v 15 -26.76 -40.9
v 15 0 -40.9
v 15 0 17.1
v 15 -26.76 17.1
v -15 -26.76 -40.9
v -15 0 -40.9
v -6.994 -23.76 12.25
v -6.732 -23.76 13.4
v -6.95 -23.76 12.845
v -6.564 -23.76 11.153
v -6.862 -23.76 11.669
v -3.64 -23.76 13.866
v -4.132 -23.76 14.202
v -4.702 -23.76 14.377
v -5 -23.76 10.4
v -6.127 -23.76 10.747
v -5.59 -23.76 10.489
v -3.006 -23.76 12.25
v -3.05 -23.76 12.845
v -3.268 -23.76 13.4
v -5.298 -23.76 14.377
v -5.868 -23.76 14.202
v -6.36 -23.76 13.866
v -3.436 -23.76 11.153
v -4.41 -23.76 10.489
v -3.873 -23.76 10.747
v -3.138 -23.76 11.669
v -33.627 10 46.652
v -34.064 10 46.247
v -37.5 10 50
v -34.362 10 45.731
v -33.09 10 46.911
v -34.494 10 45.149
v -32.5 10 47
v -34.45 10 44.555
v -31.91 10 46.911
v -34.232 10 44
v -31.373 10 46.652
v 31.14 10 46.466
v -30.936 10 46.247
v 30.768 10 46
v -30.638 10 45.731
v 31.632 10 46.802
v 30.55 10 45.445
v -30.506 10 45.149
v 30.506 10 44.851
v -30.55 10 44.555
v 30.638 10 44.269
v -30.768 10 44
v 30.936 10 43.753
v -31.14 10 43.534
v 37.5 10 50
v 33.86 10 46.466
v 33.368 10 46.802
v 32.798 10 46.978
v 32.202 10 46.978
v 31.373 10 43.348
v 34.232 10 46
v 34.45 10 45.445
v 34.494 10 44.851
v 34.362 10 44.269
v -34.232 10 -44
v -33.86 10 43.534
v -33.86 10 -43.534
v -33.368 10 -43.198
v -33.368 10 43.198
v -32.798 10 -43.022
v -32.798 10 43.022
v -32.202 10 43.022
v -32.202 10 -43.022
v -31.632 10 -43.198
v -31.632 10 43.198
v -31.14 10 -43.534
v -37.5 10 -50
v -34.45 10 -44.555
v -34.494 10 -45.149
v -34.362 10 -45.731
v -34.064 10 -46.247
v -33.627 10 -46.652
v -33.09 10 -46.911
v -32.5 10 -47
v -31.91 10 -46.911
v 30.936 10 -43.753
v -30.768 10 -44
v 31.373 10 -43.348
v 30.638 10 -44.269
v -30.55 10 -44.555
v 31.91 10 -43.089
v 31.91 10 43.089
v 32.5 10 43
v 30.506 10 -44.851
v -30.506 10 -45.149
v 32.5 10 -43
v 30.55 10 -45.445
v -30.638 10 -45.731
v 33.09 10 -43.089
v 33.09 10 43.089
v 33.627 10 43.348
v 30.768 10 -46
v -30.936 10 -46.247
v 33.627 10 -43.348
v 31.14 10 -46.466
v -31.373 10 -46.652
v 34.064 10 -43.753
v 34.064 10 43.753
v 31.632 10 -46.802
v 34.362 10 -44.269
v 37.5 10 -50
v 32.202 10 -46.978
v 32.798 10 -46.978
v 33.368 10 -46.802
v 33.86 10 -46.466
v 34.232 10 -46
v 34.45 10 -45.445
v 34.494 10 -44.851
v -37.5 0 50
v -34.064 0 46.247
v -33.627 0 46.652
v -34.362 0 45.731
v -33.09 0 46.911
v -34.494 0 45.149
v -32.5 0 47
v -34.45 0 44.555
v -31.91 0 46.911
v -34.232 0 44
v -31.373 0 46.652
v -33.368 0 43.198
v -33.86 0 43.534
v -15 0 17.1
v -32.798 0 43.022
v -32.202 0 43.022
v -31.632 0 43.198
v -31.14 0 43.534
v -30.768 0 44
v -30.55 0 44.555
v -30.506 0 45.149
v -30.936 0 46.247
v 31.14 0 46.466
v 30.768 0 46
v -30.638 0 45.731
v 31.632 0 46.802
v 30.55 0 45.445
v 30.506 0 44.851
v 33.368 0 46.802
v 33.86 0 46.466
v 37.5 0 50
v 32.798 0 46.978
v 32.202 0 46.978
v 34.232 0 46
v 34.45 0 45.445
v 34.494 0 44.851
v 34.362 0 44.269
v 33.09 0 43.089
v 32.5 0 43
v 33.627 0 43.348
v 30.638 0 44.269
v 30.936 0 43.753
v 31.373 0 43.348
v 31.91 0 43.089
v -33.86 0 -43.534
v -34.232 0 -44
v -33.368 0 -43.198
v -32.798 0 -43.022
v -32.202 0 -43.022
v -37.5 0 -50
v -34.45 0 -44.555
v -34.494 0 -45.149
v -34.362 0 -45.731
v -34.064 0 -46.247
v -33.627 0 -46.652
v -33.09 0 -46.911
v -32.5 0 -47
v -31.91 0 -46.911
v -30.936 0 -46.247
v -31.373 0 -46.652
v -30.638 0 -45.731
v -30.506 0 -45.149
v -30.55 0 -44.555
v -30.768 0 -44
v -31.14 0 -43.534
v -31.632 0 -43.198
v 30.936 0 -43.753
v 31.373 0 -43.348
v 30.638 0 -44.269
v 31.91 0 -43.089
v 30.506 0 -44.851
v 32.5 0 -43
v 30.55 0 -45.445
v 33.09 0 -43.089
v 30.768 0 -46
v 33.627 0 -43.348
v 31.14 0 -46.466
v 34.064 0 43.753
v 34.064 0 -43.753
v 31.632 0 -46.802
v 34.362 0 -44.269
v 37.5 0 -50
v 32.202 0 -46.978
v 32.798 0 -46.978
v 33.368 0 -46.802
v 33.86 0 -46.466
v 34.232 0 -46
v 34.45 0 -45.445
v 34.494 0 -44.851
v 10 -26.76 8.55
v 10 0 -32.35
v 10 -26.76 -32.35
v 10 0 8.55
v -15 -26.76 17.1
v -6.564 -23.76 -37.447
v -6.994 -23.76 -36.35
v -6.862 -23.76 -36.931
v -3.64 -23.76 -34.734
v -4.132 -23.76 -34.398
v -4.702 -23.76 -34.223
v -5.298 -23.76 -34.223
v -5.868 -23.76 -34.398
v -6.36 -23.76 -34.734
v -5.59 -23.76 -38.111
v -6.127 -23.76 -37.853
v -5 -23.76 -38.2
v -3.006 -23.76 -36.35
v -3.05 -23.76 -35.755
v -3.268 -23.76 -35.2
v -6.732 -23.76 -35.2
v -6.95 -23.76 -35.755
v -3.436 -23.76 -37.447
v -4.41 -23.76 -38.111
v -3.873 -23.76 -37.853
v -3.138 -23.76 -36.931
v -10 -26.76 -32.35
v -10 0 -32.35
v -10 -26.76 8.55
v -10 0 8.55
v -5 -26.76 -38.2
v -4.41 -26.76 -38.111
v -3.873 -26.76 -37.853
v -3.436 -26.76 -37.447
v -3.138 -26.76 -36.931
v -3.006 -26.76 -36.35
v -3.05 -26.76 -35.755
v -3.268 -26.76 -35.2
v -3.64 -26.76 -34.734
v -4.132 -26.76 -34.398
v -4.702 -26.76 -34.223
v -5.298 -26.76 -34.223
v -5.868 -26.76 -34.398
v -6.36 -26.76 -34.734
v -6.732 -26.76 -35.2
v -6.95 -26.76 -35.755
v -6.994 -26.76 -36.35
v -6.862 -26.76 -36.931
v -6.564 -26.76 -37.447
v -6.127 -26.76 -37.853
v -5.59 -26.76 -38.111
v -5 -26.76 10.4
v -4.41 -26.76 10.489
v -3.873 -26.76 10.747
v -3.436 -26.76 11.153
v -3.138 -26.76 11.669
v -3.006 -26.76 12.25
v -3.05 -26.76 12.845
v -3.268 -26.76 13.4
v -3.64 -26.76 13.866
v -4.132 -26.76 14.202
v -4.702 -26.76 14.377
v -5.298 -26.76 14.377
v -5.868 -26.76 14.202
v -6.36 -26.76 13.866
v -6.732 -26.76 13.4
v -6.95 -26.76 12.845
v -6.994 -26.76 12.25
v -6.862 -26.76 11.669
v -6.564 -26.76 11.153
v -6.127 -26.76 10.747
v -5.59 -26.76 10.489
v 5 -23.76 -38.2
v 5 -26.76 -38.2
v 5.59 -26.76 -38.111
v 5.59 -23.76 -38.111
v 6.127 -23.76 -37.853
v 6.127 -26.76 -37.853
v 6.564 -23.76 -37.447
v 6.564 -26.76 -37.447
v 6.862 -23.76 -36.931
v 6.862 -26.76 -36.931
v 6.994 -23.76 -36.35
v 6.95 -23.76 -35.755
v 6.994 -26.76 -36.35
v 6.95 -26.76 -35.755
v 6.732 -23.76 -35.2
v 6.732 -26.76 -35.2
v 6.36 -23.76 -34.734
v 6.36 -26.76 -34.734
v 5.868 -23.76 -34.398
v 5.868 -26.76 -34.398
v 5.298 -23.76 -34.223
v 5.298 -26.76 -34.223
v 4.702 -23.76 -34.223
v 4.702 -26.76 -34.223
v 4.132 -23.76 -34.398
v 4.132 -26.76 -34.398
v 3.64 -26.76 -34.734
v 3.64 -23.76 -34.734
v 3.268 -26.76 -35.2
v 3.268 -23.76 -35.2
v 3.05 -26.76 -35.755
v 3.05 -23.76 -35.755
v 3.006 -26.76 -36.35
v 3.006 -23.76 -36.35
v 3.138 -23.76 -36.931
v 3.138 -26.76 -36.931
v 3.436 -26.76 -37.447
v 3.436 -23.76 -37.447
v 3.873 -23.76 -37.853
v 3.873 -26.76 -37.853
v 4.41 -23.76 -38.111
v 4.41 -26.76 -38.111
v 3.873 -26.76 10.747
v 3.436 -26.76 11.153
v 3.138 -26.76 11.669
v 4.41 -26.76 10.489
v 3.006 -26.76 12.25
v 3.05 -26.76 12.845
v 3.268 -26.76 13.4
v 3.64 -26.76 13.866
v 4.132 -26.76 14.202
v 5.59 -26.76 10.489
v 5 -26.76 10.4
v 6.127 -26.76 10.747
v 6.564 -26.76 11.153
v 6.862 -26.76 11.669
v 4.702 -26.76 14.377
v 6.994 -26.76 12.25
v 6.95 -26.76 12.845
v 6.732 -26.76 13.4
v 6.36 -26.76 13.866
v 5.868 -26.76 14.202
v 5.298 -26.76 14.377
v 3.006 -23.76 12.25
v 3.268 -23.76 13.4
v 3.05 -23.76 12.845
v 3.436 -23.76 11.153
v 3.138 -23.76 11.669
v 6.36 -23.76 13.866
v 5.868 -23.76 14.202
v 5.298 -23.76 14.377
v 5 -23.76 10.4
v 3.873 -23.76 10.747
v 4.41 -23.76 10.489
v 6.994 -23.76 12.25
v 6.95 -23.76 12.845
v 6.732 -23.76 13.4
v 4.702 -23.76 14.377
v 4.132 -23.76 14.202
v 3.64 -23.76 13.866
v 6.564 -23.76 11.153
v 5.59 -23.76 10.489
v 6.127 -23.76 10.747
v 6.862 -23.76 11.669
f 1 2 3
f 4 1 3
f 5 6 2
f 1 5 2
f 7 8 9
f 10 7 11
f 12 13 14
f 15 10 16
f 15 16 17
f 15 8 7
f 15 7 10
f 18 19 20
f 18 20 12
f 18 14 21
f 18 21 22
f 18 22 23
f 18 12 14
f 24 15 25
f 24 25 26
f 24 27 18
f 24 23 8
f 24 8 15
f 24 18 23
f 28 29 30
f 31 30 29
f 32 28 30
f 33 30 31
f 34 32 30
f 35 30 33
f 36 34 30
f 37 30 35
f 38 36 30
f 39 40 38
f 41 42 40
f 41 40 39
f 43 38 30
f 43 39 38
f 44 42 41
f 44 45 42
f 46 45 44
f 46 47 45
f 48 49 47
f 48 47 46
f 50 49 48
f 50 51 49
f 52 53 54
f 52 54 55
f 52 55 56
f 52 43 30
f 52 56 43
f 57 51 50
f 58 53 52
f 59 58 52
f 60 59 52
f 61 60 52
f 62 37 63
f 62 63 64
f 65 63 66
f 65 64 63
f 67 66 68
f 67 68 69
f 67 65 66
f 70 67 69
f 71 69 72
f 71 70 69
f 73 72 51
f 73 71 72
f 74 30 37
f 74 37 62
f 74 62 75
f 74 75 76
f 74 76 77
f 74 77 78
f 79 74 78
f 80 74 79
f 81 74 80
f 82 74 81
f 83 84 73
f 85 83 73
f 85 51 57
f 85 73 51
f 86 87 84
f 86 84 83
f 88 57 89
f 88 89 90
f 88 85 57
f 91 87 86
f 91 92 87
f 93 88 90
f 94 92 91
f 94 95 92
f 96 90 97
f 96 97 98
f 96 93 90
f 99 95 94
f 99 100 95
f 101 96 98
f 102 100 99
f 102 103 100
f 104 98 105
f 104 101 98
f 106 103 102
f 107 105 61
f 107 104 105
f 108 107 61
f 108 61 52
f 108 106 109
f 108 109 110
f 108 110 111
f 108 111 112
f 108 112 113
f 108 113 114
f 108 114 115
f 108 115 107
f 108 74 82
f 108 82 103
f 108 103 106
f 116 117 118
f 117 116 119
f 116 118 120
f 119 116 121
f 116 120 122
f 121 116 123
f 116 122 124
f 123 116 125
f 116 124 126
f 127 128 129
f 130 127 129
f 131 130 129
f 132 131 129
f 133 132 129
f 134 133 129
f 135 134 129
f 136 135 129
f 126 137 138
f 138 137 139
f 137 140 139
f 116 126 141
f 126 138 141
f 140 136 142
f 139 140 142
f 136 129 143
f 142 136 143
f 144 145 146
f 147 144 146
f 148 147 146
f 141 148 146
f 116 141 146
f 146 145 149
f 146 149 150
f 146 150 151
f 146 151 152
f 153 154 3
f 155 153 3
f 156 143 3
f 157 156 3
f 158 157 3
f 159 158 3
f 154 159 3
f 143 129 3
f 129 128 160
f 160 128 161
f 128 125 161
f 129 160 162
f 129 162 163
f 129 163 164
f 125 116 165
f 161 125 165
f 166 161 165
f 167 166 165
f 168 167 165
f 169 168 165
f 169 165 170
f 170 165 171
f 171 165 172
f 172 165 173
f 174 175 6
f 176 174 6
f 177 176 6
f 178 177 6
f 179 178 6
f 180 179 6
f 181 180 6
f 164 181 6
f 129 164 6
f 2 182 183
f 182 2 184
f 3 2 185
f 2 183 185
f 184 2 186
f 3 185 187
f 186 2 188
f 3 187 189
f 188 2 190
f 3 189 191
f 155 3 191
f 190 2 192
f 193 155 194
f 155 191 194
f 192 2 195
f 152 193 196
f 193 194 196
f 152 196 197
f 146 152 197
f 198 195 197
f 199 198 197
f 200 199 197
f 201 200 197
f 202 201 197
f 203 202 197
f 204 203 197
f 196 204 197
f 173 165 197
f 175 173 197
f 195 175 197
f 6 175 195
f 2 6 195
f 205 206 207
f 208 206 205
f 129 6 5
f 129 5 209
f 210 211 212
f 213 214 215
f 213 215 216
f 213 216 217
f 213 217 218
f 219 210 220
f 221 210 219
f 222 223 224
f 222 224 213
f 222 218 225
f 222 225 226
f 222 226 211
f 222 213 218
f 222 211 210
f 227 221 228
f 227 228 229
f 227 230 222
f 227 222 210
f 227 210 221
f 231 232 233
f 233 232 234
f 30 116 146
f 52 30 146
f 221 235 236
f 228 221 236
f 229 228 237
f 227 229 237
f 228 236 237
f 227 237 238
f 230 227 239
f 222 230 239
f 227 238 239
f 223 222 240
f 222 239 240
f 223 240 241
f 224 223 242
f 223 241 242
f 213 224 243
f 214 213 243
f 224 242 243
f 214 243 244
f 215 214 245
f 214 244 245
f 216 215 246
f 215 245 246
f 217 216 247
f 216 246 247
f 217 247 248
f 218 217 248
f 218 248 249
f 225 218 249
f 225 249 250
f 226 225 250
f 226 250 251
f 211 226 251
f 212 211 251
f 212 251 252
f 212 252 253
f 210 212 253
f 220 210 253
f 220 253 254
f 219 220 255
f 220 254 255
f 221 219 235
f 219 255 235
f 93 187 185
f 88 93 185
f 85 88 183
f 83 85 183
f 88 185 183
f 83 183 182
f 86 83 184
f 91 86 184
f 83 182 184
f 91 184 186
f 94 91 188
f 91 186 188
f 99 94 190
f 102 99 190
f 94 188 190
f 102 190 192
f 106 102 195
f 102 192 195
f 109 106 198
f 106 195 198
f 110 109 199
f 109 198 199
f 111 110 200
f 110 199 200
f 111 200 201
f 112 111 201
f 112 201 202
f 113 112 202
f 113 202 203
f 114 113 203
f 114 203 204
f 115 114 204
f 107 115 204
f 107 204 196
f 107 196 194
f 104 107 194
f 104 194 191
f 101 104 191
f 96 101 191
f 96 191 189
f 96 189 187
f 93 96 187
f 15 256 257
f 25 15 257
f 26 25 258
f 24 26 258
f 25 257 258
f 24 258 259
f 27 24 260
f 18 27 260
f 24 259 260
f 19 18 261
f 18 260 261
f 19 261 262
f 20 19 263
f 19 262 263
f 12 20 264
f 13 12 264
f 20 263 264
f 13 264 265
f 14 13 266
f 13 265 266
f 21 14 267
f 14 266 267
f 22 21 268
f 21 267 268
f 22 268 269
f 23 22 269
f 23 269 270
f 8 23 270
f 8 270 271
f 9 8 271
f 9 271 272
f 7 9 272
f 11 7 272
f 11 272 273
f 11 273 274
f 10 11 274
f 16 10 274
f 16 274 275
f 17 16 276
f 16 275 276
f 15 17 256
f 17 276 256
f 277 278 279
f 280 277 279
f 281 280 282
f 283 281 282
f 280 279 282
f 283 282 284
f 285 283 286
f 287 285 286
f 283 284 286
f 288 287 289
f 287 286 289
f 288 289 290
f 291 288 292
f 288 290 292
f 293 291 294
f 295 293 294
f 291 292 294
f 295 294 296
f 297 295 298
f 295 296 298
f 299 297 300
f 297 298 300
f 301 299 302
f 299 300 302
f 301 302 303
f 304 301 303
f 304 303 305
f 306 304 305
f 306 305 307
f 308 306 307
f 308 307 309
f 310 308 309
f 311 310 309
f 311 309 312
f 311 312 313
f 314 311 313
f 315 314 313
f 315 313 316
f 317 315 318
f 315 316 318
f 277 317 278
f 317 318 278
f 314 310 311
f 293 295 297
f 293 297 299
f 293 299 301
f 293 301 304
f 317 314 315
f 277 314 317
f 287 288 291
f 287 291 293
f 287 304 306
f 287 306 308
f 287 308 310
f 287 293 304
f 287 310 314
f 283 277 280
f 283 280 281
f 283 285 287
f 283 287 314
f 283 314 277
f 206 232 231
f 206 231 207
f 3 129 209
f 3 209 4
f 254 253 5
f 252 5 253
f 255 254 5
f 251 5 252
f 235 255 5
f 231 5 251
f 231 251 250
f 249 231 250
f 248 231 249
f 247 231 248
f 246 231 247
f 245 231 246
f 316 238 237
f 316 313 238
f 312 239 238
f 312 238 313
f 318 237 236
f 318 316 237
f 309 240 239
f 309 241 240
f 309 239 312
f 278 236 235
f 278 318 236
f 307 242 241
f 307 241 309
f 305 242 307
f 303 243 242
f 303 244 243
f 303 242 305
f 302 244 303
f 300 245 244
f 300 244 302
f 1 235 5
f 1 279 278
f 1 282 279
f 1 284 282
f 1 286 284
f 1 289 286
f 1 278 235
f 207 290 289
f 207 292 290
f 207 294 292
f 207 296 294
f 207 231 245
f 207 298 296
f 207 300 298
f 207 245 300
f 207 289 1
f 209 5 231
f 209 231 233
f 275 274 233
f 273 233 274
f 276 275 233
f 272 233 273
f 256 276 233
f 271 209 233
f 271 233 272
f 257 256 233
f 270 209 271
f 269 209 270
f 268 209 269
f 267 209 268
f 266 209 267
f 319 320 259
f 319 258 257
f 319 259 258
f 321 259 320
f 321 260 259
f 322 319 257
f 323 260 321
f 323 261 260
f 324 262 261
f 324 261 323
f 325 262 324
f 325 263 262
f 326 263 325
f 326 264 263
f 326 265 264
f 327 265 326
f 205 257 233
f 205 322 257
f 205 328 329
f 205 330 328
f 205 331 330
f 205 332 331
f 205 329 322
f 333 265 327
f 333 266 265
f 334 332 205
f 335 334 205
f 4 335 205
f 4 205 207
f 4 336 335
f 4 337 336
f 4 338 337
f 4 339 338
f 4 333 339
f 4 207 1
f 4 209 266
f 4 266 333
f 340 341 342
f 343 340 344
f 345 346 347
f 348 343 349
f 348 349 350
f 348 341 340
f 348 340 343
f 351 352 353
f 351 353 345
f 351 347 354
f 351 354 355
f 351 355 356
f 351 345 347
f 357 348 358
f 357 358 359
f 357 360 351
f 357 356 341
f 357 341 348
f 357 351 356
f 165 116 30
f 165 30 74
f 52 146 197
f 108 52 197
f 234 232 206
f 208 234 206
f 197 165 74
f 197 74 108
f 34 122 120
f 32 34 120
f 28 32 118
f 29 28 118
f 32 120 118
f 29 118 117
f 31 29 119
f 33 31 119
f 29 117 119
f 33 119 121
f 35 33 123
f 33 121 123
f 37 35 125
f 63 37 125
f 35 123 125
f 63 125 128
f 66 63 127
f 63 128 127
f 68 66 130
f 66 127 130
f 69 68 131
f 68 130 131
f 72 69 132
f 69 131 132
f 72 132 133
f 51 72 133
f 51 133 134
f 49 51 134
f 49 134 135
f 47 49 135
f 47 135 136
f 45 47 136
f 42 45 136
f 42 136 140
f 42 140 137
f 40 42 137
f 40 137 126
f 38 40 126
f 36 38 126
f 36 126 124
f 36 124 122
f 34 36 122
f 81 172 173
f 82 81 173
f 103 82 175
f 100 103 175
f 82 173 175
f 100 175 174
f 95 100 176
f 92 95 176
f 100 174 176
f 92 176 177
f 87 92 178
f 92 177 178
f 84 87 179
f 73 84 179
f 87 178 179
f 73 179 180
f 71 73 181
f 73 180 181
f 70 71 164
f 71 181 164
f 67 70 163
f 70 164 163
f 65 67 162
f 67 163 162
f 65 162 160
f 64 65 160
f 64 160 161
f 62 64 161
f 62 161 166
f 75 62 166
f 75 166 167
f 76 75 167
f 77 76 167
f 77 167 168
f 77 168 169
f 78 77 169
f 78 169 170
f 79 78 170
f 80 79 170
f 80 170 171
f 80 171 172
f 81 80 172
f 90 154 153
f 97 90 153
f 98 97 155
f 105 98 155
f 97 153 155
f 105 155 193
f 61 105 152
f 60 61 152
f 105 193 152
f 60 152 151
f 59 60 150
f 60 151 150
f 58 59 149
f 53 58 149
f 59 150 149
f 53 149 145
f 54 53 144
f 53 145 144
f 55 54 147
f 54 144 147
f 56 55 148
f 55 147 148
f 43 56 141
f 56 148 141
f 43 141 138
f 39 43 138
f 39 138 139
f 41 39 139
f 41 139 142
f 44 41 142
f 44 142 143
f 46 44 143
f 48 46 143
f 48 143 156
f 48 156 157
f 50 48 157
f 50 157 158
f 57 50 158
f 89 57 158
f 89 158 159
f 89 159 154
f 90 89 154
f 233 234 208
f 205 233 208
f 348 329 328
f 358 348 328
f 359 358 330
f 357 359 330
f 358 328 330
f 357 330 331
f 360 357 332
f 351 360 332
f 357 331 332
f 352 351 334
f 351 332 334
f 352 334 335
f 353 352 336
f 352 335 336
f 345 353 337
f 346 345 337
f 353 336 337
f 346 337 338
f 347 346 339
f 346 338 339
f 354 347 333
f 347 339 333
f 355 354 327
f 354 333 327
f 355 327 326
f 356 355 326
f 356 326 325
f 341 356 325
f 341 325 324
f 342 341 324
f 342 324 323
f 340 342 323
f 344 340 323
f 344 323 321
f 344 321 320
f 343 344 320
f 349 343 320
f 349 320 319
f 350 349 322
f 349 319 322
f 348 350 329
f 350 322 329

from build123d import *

# Parameters (mm, degrees)
SKETCH1_W           = 75
SKETCH1_H           = 100
BOSS_EXTRUDE1_DEPTH = 10
SKETCH2_W           = 30
SKETCH2_H           = 58
SKETCH2_W_2         = 20
SKETCH2_H_2         = 40.9
BOSS_EXTRUDE2_DEPTH = 26.76
SKETCH3_R           = 2
CUT_EXTRUDE1_DEPTH  = 3
SKETCH4_R           = 2
CUT_EXTRUDE2_DEPTH  = 23


with BuildPart() as part:
    # Sketch1 → Boss-Extrude1 (new body)
    with BuildSketch(Plane(origin=(0, 0, 0), x_dir=(1, 0, 0), z_dir=(0, 1, 0))):
        Rectangle(SKETCH1_W, SKETCH1_H)
    extrude(amount=BOSS_EXTRUDE1_DEPTH)

    # Sketch2 → Boss-Extrude2 (add)
    with BuildSketch(Plane.XZ):
        with Locations((0, -11.900165179)):
            Rectangle(SKETCH2_W, SKETCH2_H)
        with Locations((0, -11.900165179)):
            Rectangle(SKETCH2_W_2, SKETCH2_H_2, mode=Mode.SUBTRACT)
    extrude(amount=BOSS_EXTRUDE2_DEPTH)

    # Sketch3 → Cut-Extrude1 (cut)
    with BuildSketch(Plane.XZ.offset(26.76)):
        with Locations(Location((-5, 12.399834821, 0), (0, 0, 270))):
            Circle(SKETCH3_R)
        with Locations(Location((5, 12.399834821, 0), (0, 0, 270))):
            Circle(SKETCH3_R)
        with Locations(Location((5, -36.200165179, 0), (0, 0, 270))):
            Circle(SKETCH3_R)
        with Locations(Location((-5, -36.200165179, 0), (0, 0, 270))):
            Circle(SKETCH3_R)
    extrude(amount=-CUT_EXTRUDE1_DEPTH, mode=Mode.SUBTRACT)

    # Sketch4 → Cut-Extrude2 (cut)
    with BuildSketch(Plane.XZ):
        with Locations(Location((-32.5, -45, 0), (0, 0, 270))):
            Circle(SKETCH4_R)
        with Locations(Location((32.5, -45, 0), (0, 0, 90))):
            Circle(SKETCH4_R)
        with Locations(Location((32.5, 45, 0), (0, 0, 270))):
            Circle(SKETCH4_R)
        with Locations(Location((-32.5, 45, 0), (0, 0, 90))):
            Circle(SKETCH4_R)
    extrude(amount=-CUT_EXTRUDE2_DEPTH, mode=Mode.SUBTRACT)


solid = part.part
